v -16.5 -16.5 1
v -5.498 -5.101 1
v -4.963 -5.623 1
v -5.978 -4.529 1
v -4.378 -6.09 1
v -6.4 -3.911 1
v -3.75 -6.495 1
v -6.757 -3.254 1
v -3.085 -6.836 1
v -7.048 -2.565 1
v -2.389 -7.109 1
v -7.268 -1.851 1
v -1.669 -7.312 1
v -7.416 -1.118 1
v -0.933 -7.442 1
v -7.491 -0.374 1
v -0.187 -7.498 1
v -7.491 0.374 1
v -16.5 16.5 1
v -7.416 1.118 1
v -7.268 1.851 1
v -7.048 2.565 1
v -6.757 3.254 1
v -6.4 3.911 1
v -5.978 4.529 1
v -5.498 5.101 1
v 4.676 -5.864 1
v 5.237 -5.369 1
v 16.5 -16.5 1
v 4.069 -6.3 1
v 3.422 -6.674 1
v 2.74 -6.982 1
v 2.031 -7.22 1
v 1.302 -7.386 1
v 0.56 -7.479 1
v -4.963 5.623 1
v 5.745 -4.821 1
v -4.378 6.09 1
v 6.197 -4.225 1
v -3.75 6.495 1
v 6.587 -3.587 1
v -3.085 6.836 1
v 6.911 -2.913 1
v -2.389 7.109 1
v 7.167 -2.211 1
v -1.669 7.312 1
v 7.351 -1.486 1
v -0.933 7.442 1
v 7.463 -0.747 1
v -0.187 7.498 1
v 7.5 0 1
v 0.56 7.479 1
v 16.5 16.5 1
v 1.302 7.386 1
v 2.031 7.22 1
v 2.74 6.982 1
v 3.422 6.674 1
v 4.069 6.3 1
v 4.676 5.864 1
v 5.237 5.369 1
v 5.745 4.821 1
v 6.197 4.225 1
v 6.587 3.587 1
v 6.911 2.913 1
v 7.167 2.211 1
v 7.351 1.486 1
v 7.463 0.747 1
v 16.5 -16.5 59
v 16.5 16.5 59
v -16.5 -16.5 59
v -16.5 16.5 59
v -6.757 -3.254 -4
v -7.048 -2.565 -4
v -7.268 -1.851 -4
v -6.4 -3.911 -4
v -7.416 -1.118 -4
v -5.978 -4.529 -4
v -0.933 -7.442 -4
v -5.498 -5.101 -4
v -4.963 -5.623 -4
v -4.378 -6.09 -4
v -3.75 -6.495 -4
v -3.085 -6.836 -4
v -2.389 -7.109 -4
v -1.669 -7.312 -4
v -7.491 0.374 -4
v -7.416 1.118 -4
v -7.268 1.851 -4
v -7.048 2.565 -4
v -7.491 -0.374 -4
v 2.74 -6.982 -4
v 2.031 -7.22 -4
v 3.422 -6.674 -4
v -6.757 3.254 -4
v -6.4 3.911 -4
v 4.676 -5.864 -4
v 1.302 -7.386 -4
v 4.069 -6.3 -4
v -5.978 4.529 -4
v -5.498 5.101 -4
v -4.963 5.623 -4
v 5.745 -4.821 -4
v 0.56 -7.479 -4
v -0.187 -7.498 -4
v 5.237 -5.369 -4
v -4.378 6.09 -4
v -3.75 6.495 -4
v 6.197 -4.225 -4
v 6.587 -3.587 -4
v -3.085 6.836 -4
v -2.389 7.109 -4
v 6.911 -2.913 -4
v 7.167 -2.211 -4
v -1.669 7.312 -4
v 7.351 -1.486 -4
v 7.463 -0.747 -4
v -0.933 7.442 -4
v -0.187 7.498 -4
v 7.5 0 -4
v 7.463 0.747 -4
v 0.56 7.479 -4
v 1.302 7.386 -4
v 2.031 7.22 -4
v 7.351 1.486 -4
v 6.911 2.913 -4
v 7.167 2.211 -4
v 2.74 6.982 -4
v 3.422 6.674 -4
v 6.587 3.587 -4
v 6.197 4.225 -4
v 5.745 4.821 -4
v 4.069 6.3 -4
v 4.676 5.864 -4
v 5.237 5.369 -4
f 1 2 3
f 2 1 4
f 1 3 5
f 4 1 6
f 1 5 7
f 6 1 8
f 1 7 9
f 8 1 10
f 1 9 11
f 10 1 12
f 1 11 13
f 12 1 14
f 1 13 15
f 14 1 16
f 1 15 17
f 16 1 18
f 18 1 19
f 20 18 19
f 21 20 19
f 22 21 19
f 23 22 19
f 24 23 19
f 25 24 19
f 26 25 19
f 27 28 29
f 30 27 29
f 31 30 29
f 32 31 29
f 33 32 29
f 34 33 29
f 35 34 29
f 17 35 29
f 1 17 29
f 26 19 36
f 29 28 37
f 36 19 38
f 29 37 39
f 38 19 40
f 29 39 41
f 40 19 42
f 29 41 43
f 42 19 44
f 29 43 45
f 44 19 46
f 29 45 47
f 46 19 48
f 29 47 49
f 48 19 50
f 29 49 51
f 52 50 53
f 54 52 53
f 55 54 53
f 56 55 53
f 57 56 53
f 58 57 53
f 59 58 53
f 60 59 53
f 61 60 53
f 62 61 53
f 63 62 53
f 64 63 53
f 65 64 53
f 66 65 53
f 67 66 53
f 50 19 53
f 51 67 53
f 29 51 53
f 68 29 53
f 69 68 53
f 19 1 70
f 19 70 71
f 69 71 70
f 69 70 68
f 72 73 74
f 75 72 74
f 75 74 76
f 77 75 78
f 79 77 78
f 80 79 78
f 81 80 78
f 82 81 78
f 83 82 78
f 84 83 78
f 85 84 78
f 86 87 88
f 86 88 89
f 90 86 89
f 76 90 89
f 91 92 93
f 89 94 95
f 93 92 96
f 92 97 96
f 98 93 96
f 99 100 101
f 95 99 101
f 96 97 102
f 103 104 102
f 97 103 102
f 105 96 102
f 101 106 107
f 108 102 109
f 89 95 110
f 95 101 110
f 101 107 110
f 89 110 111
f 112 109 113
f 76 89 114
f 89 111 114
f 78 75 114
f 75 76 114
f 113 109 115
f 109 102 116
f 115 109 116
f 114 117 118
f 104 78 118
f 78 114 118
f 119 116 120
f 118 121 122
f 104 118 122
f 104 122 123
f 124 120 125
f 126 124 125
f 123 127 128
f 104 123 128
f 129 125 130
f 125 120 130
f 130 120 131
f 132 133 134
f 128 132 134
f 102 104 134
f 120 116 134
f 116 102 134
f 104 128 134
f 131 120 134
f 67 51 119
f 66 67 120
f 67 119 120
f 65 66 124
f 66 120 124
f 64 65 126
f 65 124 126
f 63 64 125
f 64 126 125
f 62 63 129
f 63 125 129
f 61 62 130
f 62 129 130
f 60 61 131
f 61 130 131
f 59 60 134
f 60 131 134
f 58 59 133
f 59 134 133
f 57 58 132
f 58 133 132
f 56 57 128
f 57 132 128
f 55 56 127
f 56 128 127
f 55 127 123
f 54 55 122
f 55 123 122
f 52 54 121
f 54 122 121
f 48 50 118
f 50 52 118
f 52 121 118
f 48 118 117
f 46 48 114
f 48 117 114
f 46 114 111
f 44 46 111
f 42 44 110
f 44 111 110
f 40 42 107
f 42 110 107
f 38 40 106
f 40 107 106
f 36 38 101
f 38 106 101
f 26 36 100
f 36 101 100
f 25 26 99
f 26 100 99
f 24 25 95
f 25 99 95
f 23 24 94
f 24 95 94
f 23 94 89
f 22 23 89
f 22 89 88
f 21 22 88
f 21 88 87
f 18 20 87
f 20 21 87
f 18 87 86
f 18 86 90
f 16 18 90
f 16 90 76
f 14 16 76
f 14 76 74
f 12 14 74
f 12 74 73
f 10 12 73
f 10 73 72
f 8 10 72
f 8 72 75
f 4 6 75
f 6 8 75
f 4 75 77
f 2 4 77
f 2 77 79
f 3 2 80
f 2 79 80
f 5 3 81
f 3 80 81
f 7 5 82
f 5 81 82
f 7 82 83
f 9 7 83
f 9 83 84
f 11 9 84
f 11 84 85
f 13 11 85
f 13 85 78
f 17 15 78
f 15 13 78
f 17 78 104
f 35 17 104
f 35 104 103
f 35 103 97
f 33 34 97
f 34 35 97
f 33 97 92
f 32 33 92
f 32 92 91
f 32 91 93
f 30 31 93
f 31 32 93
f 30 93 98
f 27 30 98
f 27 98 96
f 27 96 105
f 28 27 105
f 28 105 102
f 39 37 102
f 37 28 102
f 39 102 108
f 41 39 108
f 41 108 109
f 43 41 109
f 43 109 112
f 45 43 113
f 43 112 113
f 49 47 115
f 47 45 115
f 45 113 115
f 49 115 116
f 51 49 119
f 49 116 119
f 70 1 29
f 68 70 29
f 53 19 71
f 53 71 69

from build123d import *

# Parameters (mm, degrees)
BOX002_W          = 33
BOX002_H          = 33
BOX002_DEPTH      = 58
CYLINDER005_R     = 7.5
CYLINDER005_DEPTH = 10


with BuildPart() as cube002:
    # Box002 → Box002 (new body)
    with BuildSketch(Plane(origin=(-16.5, -16.5, 3), x_dir=(1, 0, 0), z_dir=(0, 0, 1))):
        with Locations((16.5, 16.5)):
            Rectangle(BOX002_W, BOX002_H)
    extrude(amount=BOX002_DEPTH)


with BuildPart() as laser_module:
    # Cylinder005 → Cylinder005 (new body)
    with BuildSketch(Plane.XY.offset(-2)):
        Circle(CYLINDER005_R)
    extrude(amount=CYLINDER005_DEPTH)

    # Fusion006: union Cube002
    add(cube002.part)


with BuildPart() as laser_module_1:
    # Fusion006 placement: moved
    add(laser_module.part.moved(Location((0, 0, -2))))


solid = laser_module_1.part
